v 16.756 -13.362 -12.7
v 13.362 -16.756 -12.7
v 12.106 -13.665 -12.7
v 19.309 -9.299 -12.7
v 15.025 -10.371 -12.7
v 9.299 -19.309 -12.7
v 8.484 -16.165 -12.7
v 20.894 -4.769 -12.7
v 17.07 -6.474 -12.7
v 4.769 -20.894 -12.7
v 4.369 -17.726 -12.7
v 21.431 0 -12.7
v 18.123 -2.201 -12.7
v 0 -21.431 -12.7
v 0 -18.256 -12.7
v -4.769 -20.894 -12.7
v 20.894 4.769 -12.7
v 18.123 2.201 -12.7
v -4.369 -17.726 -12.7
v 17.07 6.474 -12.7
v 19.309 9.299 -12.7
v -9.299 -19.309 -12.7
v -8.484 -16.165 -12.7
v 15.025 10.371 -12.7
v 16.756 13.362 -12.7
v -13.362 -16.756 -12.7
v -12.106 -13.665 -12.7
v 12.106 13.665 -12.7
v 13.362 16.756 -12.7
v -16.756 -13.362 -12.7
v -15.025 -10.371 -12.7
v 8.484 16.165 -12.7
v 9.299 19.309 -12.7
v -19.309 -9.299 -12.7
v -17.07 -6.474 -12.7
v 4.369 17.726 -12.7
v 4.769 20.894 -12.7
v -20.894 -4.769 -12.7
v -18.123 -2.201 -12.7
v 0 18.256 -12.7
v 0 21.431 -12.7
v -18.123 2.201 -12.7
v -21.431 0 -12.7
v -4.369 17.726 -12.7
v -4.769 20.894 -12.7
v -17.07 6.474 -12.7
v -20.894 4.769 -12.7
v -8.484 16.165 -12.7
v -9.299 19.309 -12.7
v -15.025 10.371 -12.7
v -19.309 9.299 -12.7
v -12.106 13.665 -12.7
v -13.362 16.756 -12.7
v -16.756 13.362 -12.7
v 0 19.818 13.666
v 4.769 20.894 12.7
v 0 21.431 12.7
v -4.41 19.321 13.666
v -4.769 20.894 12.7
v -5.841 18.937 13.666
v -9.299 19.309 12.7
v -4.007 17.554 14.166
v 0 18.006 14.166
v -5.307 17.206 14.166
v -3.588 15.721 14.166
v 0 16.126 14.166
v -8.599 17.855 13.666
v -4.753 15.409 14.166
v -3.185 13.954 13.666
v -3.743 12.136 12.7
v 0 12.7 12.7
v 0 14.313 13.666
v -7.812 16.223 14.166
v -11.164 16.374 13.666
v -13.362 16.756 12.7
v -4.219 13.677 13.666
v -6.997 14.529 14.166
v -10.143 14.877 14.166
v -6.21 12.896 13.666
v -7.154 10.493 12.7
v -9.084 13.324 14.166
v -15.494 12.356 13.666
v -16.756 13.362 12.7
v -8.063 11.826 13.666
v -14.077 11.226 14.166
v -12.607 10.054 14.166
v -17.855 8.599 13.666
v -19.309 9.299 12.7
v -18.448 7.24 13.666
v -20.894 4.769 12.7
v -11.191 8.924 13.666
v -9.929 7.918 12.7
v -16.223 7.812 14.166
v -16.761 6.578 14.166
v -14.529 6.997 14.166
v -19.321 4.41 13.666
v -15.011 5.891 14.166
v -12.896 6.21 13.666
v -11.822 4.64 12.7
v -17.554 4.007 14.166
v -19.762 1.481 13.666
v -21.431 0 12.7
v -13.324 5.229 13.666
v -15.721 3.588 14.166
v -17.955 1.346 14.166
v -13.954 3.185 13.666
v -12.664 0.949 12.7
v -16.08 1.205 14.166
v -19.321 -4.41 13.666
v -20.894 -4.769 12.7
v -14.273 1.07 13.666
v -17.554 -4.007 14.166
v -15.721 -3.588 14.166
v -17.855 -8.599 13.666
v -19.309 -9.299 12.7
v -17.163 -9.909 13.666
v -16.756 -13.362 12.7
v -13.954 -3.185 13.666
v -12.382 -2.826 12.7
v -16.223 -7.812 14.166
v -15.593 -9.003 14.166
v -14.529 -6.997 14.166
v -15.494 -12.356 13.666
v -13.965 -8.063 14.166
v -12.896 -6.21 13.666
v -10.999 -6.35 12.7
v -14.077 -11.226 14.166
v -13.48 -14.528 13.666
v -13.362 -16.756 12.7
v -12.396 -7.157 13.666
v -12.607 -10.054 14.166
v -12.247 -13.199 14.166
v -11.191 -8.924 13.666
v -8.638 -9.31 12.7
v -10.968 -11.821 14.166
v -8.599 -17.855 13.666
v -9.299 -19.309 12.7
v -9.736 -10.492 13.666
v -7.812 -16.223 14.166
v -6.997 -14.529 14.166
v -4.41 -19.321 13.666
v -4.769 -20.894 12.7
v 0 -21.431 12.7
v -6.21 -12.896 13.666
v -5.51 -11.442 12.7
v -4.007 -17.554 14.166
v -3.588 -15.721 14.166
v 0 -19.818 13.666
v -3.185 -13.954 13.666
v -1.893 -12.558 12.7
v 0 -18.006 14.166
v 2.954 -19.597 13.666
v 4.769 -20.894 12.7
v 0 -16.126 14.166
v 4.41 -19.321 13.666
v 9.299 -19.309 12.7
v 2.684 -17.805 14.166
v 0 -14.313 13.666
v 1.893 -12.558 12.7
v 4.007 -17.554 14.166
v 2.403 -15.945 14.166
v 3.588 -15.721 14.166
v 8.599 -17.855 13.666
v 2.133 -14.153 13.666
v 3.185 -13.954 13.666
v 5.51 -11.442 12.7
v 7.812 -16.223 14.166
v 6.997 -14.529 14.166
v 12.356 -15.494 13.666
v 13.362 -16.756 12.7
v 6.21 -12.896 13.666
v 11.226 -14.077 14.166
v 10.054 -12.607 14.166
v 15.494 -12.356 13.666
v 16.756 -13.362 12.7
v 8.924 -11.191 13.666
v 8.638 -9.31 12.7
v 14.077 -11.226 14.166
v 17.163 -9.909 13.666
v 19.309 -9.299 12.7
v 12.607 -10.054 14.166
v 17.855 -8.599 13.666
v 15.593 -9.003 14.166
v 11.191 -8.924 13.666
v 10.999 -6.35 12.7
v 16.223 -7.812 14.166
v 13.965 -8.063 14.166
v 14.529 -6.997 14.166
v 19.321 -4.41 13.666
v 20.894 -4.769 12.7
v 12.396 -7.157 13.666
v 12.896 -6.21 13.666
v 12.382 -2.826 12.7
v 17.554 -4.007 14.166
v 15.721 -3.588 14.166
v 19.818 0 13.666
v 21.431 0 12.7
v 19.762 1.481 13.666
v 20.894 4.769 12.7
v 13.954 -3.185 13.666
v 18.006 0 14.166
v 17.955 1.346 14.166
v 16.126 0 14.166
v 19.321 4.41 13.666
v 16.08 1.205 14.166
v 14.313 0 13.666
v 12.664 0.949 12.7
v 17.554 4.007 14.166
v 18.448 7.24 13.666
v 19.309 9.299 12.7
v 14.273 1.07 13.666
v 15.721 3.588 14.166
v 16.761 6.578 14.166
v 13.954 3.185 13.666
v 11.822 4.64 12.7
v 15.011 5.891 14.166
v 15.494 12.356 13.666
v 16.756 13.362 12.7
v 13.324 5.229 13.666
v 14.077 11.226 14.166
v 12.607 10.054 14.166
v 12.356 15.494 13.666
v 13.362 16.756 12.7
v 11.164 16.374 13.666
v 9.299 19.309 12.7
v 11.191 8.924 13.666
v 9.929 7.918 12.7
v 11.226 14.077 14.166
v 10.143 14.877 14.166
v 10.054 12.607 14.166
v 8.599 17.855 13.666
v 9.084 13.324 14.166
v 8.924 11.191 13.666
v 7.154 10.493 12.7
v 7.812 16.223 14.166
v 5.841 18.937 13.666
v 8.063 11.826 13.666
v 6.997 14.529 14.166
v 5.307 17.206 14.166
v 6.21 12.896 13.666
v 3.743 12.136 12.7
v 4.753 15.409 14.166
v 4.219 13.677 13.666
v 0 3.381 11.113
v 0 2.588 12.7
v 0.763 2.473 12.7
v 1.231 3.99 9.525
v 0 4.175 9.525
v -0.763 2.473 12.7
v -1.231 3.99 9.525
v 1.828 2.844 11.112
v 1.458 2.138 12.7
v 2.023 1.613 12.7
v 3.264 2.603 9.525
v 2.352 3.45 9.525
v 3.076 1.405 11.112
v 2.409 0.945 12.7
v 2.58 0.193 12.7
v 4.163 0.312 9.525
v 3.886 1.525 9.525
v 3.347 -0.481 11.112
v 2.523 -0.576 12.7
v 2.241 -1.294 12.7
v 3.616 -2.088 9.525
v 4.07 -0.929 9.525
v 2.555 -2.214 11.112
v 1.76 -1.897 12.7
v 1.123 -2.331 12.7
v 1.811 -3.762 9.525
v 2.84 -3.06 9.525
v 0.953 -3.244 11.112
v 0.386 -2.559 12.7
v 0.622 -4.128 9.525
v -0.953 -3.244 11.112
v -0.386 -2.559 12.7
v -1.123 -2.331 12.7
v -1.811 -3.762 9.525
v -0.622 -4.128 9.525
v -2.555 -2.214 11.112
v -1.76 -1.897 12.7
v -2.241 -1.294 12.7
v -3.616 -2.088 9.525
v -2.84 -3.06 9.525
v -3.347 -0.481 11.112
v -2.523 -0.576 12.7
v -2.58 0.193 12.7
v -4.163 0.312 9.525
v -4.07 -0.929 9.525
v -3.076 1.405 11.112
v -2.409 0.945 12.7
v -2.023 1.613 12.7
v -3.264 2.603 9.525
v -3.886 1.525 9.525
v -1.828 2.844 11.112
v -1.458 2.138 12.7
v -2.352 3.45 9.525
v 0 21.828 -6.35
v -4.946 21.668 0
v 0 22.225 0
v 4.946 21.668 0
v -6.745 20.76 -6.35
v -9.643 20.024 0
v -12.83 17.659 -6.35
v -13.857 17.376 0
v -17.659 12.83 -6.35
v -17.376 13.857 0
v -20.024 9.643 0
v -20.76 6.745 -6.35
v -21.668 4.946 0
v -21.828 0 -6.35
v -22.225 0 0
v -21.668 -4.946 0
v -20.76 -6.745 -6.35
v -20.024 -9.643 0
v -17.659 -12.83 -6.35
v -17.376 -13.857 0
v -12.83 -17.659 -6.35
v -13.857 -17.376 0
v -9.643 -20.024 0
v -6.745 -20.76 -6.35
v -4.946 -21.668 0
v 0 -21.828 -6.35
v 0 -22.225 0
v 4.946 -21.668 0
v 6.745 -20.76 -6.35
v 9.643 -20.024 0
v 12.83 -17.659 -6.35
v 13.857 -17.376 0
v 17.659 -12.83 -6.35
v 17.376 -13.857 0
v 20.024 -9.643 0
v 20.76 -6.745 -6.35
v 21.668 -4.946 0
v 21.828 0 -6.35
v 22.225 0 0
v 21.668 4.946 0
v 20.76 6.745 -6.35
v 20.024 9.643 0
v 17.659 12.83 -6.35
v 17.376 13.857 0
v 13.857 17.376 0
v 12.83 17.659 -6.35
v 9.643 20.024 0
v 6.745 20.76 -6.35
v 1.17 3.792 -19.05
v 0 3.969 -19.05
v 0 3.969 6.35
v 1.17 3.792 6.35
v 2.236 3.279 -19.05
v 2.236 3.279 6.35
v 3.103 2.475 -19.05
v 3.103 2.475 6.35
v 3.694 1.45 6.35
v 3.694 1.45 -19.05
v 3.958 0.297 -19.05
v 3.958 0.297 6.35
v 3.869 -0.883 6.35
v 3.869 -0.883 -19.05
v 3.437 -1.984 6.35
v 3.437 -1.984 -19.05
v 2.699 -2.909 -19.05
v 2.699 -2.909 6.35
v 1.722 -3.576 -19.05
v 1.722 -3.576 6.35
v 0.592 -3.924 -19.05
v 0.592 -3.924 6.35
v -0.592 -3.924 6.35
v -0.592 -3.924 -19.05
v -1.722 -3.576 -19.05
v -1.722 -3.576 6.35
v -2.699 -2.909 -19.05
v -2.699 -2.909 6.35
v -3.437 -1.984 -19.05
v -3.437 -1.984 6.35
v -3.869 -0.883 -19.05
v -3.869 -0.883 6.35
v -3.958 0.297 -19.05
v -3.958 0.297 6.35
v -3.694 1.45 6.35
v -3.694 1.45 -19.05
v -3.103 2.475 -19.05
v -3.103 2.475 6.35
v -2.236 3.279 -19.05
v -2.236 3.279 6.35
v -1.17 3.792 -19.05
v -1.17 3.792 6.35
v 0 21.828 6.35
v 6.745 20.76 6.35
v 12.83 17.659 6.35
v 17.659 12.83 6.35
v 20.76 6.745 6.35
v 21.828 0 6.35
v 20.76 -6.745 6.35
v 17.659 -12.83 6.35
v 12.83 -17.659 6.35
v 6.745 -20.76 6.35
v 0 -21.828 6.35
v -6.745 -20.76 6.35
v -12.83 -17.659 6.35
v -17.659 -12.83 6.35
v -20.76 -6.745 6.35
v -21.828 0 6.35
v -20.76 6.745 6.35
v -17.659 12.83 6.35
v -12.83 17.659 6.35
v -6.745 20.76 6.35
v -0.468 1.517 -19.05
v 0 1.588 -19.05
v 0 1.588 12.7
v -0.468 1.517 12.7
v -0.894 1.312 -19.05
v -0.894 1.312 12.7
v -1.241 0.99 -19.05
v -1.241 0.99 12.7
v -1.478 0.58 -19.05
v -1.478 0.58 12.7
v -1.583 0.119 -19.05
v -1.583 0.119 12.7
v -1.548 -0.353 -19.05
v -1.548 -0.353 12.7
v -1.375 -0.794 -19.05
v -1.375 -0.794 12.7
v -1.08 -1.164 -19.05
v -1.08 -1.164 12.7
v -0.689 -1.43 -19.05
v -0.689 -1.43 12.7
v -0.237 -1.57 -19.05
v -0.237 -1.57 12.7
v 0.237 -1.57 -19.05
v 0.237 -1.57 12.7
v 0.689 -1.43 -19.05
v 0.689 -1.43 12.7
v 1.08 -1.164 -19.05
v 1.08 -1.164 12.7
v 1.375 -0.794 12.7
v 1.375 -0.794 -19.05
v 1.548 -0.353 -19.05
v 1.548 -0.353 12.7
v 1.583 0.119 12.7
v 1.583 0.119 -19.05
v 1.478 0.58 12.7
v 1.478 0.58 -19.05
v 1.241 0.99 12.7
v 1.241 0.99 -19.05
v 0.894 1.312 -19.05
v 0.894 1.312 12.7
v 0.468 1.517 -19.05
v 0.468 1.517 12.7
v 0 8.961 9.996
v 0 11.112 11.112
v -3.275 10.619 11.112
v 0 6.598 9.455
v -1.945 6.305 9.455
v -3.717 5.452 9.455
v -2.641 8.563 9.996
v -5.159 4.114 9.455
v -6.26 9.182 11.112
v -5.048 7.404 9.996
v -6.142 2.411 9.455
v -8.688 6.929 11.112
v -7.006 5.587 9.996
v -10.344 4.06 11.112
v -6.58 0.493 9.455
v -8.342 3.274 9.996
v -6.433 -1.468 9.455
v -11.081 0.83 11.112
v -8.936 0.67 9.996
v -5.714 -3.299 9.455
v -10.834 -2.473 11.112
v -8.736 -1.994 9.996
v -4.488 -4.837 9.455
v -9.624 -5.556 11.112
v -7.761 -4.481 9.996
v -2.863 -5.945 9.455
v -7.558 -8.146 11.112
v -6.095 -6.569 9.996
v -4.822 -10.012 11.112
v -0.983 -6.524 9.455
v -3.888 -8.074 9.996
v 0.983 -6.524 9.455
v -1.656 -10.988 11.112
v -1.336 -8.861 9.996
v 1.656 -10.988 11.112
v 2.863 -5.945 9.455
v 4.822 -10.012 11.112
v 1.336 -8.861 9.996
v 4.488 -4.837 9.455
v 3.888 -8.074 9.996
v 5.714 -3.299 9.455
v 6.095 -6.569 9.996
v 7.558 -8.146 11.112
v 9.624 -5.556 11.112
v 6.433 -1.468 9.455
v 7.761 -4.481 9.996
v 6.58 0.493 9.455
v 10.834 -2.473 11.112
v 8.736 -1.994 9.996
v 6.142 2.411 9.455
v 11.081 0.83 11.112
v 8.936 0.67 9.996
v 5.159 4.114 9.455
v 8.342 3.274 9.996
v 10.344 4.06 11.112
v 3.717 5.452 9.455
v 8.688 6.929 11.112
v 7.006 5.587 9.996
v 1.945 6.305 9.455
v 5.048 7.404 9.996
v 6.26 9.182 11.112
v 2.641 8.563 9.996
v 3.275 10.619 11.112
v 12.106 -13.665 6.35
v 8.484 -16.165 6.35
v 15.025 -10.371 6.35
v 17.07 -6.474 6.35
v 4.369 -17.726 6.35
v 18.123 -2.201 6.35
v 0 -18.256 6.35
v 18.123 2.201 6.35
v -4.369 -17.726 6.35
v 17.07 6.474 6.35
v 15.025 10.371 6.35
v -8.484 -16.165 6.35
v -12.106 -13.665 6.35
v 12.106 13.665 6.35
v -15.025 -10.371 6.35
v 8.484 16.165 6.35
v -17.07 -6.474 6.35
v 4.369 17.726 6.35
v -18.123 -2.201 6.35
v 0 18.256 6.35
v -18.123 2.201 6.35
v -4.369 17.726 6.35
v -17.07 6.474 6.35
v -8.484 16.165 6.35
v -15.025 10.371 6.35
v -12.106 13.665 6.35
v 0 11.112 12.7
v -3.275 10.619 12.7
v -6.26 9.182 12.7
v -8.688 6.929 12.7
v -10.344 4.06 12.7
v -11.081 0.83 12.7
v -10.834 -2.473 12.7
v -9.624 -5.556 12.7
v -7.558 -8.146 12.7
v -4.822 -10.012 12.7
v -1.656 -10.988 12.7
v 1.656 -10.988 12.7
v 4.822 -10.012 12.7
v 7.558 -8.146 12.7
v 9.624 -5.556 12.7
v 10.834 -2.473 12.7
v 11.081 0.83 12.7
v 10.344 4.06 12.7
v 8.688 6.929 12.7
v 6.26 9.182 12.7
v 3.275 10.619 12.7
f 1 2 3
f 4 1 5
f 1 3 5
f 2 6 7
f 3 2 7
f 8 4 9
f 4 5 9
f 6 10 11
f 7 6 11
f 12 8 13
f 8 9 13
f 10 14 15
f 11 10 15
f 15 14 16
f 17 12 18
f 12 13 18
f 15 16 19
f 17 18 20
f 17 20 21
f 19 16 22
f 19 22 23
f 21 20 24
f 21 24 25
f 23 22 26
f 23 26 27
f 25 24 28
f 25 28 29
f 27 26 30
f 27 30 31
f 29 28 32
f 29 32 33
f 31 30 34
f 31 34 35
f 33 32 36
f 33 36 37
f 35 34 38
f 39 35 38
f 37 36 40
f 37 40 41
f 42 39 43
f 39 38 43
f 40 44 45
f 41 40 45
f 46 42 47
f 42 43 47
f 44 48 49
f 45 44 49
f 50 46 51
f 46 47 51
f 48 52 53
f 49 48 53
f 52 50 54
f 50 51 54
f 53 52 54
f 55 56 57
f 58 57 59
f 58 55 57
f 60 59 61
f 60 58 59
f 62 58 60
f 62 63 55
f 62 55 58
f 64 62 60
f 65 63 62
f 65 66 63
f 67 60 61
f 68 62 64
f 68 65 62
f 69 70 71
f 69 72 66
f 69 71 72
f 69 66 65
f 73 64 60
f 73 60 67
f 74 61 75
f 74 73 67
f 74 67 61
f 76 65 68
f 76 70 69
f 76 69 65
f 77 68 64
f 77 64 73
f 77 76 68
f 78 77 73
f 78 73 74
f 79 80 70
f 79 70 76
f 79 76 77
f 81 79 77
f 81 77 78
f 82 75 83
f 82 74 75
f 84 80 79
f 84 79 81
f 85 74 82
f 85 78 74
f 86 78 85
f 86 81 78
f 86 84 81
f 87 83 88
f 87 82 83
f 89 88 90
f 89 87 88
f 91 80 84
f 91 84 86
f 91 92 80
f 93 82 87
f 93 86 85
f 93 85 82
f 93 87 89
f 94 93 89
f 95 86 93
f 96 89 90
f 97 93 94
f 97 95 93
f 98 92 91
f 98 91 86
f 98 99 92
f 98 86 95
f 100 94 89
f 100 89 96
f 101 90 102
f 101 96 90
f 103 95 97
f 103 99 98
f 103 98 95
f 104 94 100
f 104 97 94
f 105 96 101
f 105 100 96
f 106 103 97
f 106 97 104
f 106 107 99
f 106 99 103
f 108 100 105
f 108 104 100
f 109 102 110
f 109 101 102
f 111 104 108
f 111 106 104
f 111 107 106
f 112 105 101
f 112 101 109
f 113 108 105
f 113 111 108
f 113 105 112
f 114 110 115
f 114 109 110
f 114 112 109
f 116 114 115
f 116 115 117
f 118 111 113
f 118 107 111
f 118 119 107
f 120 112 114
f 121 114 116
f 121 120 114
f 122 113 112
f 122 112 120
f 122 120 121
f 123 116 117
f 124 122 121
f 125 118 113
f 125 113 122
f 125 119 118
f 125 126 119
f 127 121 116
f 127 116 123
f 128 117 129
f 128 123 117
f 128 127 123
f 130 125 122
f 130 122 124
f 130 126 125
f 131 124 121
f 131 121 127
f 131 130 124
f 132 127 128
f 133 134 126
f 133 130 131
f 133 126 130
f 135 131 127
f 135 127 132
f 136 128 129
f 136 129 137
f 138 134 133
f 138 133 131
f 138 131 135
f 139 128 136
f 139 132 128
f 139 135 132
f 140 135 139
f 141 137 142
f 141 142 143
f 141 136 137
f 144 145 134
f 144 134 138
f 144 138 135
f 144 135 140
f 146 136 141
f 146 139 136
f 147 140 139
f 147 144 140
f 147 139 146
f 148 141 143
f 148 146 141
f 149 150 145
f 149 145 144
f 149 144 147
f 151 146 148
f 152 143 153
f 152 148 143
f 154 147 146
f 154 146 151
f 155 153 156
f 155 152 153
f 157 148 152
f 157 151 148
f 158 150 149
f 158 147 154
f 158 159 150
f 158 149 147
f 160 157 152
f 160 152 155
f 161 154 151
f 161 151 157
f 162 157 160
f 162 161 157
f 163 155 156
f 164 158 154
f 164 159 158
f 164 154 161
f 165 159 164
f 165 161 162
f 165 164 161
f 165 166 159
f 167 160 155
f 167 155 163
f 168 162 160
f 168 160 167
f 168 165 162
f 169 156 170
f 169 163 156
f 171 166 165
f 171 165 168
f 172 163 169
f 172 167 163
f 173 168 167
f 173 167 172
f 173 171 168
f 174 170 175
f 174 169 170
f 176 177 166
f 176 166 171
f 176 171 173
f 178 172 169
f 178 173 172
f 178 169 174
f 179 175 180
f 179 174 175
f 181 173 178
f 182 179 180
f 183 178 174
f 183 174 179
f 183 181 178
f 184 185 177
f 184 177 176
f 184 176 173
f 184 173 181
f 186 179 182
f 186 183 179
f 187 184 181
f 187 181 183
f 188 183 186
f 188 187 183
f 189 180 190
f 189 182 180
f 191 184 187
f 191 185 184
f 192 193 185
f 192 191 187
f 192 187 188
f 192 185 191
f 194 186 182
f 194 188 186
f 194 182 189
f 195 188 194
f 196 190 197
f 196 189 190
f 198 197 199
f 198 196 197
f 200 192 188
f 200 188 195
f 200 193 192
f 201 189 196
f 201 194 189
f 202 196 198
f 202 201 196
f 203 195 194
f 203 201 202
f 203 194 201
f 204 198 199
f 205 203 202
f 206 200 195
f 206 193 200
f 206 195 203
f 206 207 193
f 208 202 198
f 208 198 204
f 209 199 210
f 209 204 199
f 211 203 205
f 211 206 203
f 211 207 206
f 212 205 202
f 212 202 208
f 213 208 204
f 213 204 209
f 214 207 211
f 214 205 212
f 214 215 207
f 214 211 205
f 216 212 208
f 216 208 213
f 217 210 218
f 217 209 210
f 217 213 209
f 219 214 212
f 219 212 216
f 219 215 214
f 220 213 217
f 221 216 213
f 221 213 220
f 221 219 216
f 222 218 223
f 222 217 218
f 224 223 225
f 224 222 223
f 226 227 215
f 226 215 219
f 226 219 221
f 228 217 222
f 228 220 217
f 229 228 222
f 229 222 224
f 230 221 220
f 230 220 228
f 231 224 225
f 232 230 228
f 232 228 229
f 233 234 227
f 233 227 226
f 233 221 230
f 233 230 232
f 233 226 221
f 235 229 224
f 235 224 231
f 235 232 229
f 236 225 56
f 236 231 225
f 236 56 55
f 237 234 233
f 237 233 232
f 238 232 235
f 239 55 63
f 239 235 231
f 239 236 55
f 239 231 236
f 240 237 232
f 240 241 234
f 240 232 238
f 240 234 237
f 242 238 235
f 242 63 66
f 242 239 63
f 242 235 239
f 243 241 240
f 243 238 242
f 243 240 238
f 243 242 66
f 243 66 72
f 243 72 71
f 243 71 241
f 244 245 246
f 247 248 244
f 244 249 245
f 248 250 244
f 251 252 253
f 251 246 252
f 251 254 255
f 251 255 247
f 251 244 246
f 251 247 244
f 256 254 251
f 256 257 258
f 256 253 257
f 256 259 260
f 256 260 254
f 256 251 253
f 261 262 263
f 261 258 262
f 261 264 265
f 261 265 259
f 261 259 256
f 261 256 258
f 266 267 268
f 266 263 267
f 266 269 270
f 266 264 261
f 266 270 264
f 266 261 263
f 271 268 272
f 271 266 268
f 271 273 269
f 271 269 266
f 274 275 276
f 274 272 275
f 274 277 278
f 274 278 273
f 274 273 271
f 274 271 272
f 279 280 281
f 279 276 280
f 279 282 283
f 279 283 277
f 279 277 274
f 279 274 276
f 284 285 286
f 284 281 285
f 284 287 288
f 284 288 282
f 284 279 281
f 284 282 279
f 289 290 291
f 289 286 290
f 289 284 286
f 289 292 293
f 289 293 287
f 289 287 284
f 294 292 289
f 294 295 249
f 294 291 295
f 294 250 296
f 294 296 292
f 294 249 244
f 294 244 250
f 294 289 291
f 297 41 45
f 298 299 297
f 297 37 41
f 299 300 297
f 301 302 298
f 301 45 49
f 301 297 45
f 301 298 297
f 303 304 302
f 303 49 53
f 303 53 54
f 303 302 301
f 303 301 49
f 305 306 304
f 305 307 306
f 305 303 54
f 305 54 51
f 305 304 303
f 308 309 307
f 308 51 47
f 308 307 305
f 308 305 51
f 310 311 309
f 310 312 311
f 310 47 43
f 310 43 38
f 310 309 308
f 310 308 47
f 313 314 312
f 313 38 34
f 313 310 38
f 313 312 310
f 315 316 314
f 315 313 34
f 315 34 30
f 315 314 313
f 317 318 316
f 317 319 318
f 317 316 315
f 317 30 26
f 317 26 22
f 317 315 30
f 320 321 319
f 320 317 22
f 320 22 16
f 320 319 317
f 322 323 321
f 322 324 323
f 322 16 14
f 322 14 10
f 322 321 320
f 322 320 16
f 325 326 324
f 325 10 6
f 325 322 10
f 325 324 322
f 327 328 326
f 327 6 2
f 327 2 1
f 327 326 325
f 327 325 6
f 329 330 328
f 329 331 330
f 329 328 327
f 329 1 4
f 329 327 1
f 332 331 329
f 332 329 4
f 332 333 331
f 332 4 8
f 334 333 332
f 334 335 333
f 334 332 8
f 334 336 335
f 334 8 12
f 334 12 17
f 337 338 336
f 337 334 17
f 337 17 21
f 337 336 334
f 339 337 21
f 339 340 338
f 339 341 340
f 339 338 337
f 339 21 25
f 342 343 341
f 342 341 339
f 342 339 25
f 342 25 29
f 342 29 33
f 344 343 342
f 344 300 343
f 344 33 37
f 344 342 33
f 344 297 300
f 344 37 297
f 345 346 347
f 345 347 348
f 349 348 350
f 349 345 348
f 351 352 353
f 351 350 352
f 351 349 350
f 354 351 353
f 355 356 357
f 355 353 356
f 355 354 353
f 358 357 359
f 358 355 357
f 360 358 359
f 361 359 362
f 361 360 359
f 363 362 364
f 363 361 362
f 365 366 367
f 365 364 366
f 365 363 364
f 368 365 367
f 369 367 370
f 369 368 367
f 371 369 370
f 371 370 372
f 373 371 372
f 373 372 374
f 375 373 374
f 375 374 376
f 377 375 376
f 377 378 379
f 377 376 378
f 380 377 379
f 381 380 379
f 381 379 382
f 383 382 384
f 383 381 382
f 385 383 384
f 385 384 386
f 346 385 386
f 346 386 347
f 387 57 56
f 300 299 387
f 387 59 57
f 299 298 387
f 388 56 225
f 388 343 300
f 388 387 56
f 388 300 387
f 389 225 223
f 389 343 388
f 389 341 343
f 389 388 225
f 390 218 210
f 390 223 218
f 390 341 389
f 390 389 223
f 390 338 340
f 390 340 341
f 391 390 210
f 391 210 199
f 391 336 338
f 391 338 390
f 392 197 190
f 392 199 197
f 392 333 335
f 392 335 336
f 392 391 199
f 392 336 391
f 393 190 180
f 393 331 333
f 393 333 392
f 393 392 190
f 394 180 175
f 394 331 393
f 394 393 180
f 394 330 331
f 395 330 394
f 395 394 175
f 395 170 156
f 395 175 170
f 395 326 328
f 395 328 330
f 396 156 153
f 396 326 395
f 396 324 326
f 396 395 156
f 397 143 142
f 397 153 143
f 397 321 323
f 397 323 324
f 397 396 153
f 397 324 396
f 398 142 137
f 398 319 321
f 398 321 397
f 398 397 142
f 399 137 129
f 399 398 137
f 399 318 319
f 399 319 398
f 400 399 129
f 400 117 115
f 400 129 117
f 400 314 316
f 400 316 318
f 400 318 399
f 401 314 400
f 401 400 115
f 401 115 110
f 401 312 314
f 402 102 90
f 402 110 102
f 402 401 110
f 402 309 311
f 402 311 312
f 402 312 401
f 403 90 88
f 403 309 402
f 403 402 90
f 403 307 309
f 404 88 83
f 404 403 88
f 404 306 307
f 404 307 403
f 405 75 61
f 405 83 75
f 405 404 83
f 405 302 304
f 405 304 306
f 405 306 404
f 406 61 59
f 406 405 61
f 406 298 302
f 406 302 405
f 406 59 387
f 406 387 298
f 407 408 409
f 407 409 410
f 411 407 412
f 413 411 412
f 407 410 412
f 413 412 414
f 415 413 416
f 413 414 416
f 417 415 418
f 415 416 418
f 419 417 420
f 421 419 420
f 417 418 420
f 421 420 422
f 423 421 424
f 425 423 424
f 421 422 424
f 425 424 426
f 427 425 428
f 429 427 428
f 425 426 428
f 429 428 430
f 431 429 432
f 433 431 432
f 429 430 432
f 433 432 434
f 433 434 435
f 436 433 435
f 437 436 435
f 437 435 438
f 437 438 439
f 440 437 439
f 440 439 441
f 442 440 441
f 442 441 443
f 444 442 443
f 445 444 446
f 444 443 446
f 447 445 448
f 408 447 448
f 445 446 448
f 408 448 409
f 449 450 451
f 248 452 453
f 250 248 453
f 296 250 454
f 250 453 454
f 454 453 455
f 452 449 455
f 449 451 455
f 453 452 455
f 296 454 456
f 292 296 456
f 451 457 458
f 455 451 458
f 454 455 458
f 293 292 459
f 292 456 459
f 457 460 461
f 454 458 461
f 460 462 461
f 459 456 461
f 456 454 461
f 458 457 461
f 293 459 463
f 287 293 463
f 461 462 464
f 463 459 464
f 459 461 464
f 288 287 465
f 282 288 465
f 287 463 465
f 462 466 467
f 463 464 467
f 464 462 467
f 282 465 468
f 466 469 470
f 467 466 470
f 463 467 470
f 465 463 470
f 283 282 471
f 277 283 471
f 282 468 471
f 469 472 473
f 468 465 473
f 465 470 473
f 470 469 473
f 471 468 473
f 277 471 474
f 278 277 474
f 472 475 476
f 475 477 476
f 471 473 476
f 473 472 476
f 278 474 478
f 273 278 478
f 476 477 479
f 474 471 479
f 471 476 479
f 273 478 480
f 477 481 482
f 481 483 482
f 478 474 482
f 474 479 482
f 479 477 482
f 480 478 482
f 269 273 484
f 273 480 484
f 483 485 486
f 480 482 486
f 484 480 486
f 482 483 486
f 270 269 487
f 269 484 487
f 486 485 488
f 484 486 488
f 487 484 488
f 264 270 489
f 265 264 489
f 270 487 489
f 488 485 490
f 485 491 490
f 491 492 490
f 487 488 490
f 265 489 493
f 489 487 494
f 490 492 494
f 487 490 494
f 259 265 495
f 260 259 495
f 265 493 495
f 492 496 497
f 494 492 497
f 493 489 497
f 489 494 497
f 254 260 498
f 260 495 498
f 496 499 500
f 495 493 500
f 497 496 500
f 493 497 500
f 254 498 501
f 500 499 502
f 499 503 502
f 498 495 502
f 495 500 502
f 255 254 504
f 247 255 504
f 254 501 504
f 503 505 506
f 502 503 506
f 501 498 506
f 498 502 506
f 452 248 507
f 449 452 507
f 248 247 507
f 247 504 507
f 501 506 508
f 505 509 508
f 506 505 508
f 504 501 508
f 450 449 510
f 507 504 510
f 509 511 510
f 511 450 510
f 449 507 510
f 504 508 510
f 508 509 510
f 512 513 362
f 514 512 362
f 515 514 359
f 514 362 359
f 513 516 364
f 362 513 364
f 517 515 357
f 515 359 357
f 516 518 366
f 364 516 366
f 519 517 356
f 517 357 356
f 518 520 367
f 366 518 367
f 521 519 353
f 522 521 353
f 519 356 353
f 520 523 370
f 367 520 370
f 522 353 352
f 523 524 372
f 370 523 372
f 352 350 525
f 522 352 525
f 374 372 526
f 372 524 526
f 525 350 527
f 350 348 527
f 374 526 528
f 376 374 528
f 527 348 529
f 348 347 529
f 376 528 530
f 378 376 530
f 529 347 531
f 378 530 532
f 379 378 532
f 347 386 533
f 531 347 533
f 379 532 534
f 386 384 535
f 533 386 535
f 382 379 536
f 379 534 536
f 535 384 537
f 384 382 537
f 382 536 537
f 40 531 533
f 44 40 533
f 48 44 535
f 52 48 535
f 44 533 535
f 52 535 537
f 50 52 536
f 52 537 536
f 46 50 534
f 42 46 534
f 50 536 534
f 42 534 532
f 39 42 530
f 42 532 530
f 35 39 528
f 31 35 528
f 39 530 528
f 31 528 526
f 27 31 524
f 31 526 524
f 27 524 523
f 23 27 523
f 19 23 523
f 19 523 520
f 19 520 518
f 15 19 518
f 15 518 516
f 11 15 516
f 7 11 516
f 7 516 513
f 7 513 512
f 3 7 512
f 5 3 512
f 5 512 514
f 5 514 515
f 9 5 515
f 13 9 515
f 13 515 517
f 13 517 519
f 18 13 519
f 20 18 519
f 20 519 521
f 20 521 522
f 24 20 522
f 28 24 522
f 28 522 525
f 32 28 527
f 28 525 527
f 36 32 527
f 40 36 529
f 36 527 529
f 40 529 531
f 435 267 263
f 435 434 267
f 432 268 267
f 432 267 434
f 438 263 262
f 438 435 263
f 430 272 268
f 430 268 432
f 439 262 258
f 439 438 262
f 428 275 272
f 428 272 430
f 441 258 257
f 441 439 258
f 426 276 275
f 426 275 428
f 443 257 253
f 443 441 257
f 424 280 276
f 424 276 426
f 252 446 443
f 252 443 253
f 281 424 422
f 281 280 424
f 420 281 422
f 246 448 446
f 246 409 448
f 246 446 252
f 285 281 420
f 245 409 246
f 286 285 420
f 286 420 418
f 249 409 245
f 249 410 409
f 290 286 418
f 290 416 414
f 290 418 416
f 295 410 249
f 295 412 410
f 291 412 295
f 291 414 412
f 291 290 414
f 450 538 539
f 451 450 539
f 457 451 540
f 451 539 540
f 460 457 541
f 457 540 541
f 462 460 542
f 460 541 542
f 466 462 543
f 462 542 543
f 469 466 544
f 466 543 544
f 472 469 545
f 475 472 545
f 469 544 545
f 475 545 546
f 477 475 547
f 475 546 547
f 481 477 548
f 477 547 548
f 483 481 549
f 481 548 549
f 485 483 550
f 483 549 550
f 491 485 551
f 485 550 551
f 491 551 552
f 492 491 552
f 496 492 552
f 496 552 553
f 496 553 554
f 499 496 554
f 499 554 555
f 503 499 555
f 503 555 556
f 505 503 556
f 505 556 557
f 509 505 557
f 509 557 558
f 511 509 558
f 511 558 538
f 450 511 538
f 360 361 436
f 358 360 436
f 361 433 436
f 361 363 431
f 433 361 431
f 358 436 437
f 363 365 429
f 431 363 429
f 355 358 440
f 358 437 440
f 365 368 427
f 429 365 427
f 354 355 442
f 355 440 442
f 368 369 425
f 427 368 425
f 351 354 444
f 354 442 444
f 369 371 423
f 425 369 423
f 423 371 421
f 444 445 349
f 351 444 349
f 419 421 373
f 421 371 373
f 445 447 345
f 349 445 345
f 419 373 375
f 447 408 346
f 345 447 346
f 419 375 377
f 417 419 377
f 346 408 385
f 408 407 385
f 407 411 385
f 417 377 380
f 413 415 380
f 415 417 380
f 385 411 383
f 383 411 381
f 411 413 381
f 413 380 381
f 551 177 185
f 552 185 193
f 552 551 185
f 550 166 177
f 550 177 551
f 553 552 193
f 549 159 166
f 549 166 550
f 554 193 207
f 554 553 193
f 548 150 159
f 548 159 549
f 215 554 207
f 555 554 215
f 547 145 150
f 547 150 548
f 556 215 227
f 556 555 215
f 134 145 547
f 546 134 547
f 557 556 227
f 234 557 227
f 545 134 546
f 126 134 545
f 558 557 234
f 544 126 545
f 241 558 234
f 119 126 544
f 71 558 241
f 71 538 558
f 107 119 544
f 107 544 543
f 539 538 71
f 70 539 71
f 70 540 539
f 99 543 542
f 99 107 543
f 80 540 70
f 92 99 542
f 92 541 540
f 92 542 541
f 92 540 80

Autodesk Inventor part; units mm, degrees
ref_plane "YZ Plane" through (0, 0, 0) normal (1, 0, 0) x (0, 1, 0)
ref_plane "XZ Plane" through (0, 0, 0) normal (0, 1, 0) x (-1, 0, 0)
ref_plane "XY Plane" through (0, 0, 0) normal (0, 0, 1) x (1, 0, 0)
sketch "Sketch1" plane through (0, 0, 0) normal (1, 0, 0) x (0, 1, 0)
  line L0 (1.5875, -19.05) -> (1.5875, 12.7)
  line L1 (1.5875, 12.7) -> (2.5875, 12.7)
  line L2 (2.5875, 12.7) -> (4.175, 9.525)
  arc A0 (4.175, 9.525) -> (11.1125, 11.1125) centre (5.6612, 18.9827) ccw
  line L3 (11.1125, 11.1125) -> (11.1125, 12.7)
  line L4 (11.1125, 12.7) -> (12.7, 12.7)
  line L5 (21.4312, 12.7) -> (22.225, 0)
  line L6 (18.2563, -12.7) -> (18.2562, 6.35)
  line L7 (18.2562, 6.35) -> (3.9688, 6.35)
  line L8 (3.9688, 6.35) -> (3.9688, -19.05)
  line L9 (3.9688, -19.05) -> (1.5875, -19.05)
  arc A1 (21.4312, 12.7) -> (12.7, 12.7) centre (17.0656, 7.236) ccw
  line L10 (22.225, 0) -> (21.4312, -12.7)
  line L11 (21.4312, -12.7) -> (18.2563, -12.7)
  line L12 (0, -26.6565) -> (0, 26.5892) projected
  point P0 (0, 0)
  dimension "d0" = 1.5875
  dimension "d1" = 1
  dimension "d2" = 3.175
  dimension "d3" = 1.5875
  dimension "d4" = 11.1125
  dimension "d5" = 12.7
  dimension "d6" = 1.5875
  dimension "d7" = 21.4312
  dimension "d8" = 22.225
  dimension "d9" = 12.7
  dimension "d10" = 12.7
  dimension "d11" = 0
  dimension "d13" = 12.7
  dimension "d14" = 21.4312
  dimension "d15" = 3.175
  dimension "d16" = 19.05
  dimension "d17" = 2.3813
  dimension "d18" = 6.35
  dimension "d19" = 6.35
  dimension "d20" = 12.7
  dimension "d21" = 9.5738
  dimension "d22" = 6.9938
revolve "Revolution1" add sketch "Sketch1" angle 360 about axis through (0, 0, -10) along (0, 0, 1)
equation "\"d14\" = d7"
equation "\"d19\" = d18"
properties part number "launcher_wheel"
